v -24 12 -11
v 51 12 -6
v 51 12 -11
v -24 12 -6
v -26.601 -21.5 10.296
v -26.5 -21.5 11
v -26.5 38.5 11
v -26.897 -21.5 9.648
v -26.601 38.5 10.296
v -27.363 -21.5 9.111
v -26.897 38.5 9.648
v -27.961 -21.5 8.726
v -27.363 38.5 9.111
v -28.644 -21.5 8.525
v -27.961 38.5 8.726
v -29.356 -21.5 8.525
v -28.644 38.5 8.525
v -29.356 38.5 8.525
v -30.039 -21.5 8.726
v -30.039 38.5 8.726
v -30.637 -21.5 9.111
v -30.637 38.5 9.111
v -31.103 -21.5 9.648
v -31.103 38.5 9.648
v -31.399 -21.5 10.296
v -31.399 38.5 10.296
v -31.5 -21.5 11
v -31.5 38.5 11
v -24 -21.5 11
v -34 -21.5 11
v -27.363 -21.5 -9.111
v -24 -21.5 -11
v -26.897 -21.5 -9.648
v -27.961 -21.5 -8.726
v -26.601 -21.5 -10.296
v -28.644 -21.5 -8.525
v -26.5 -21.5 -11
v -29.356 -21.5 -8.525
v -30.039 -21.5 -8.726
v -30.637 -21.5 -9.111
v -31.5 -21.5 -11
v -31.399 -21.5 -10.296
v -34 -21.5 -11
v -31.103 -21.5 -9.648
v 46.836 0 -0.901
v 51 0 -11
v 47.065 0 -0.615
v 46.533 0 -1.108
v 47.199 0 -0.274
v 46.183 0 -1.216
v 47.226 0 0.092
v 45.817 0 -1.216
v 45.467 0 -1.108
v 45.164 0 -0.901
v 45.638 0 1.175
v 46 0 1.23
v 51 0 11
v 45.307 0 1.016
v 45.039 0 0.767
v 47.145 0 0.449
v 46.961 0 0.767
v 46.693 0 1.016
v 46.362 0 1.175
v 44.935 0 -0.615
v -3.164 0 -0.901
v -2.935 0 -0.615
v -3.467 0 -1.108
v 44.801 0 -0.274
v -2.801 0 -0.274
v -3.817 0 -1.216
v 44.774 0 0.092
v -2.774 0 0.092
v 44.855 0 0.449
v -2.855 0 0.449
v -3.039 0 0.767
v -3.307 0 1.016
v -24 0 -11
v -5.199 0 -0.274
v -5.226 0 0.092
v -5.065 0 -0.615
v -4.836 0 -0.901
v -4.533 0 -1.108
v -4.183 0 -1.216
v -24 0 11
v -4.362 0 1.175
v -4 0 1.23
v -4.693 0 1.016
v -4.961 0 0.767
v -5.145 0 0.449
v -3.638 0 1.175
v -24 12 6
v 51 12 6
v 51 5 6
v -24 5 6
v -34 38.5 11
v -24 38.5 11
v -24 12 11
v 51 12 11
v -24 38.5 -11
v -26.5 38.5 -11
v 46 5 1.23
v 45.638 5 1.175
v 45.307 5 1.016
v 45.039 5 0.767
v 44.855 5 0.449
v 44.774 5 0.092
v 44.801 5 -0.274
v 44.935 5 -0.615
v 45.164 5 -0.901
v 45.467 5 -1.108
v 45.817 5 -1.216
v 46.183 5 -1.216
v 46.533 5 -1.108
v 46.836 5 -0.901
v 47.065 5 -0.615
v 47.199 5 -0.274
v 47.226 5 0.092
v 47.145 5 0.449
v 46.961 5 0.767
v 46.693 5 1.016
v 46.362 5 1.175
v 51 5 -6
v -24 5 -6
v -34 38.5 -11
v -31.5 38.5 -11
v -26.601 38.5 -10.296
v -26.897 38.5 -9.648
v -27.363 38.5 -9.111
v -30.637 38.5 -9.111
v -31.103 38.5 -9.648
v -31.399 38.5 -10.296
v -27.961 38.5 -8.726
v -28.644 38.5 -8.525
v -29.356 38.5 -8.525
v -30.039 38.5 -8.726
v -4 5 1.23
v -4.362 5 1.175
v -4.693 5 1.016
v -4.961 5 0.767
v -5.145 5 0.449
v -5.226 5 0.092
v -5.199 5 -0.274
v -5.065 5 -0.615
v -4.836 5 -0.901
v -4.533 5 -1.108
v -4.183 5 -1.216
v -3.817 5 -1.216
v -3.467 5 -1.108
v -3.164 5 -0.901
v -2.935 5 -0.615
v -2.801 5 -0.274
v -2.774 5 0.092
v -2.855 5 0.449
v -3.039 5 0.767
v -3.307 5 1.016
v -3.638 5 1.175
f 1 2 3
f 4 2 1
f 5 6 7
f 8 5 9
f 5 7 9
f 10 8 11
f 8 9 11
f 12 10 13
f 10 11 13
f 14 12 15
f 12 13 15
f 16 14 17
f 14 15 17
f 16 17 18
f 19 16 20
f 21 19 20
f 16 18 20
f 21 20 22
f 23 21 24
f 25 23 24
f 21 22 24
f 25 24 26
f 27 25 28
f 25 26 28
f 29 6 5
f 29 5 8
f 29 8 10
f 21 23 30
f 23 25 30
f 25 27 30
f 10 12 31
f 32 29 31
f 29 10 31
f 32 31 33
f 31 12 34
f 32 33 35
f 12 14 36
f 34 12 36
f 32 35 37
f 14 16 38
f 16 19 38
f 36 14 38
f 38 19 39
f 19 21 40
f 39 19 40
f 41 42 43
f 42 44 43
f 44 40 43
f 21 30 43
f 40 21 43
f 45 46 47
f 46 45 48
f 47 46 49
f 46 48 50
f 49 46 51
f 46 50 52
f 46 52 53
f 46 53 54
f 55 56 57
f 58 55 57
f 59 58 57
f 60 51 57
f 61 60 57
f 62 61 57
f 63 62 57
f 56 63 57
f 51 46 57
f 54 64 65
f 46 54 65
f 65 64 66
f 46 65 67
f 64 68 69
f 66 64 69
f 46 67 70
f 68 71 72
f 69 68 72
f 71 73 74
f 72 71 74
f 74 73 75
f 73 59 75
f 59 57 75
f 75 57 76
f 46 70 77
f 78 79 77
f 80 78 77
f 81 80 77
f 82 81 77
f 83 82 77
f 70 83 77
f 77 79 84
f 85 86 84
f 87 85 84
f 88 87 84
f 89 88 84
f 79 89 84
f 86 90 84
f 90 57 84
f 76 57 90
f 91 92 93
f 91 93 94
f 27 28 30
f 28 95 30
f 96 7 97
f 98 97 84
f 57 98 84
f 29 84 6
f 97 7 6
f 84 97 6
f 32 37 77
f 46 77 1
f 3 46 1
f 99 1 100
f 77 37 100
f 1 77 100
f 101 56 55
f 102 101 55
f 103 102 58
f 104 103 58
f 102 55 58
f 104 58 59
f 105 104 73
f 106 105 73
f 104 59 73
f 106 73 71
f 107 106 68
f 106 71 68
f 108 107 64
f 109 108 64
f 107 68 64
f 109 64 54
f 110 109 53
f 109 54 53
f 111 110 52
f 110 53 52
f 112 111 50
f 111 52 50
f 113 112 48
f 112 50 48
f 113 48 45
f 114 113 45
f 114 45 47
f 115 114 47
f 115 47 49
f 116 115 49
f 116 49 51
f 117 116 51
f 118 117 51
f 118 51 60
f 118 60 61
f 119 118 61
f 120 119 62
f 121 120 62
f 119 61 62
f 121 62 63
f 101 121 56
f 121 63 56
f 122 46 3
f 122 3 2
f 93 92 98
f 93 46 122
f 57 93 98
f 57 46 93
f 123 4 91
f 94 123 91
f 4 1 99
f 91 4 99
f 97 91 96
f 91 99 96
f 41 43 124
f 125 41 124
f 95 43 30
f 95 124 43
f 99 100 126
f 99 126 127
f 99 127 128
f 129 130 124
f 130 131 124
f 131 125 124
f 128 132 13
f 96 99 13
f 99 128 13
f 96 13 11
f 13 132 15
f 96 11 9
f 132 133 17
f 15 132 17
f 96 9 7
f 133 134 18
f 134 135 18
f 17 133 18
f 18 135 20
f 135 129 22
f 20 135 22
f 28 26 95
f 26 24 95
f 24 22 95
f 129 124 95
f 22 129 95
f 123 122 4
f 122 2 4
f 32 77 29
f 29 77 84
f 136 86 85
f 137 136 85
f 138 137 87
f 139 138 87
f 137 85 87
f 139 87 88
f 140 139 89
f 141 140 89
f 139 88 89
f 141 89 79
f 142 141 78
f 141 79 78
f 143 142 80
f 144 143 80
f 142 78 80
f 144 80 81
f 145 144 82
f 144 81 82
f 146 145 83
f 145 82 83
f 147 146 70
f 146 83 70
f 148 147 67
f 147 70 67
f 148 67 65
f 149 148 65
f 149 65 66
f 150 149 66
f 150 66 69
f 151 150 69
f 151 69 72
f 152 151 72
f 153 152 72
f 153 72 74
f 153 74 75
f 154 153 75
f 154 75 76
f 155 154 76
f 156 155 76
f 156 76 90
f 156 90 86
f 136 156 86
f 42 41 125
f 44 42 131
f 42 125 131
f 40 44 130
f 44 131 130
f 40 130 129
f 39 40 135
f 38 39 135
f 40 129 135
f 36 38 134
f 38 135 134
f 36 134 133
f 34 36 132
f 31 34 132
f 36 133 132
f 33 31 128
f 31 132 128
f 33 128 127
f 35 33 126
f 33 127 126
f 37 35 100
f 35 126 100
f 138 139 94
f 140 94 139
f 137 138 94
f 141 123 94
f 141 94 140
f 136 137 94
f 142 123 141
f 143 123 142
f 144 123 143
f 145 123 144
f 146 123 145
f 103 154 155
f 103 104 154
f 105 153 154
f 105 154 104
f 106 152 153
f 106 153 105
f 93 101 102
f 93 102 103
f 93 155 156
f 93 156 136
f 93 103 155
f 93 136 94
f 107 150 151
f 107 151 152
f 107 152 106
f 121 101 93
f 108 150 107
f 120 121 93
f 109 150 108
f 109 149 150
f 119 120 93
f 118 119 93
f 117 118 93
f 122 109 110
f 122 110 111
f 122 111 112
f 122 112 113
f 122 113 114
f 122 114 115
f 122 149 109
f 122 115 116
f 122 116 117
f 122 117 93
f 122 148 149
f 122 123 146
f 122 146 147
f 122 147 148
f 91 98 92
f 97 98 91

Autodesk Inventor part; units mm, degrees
ref_plane "YZ Plane" through (0, 0, 0) normal (1, 0, 0) x (0, 1, 0)
ref_plane "XZ Plane" through (0, 0, 0) normal (0, 1, 0) x (-1, 0, 0)
ref_plane "XY Plane" through (0, 0, 0) normal (0, 0, 1) x (1, 0, 0)
sketch "スケッチ1" plane through (0, 0, 0) normal (0, 1, 0) x (-1, 0, 0)
  line L0 (34, -11) -> (-51, -11)
  line L1 (-51, -11) -> (-51, 11)
  line L2 (-51, 11) -> (34, 11)
  line L3 (34, 11) -> (34, -11)
  line L4 (34, 0) -> (-51, 0) construction
  point P0 (0, 0)
  point P1 (0, 0)
  point P2 (-46, 0)
  dimension "d0" = 22
  dimension "d1" = 85
  dimension "d2" = 5
  dimension "d3" = 46
extrude "押し出し1" add sketch "スケッチ1" along normal blind 12
sketch "スケッチ2" plane through (0, 12, 0) normal (0, 1, 0) x (1, 0, 0)
  line L0 (-34, 11) -> (-34, -11) projected
  line L1 (51, -11) -> (51, 11) projected
  line L2 (-34, 0) -> (51, 0)
  line L3 (51, 0) -> (51, 6)
  line L4 (51, 6) -> (-34, 6)
  line L5 (-34, 6) -> (-34, 0)
  line L6 (51, 0) -> (51, -6)
  line L7 (51, -6) -> (-34, -6)
  line L8 (-34, -6) -> (-34, 0)
  point P0 (0, 0)
  point P1 (-34, -6)
  point P2 (-34, 6)
  dimension "d6" = 12
extrude "押し出し2" cut sketch "スケッチ2" against normal blind 7
sketch "スケッチ3" plane through (0, 5, 0) normal (0, 1, 0) x (1, 0, 0)
  point P0 (0, 0)
  point P1 (-4, 0)
  point P2 (46, 0)
  dimension "d9" = 4
  dimension "d10" = 50
hole "穴1" at (-4, 5, 0) at (46, 5, 0) direction (0, -1, 0) diameter 2.459 end through all thread size "M3x0.5" class "6H" standard "ISO Metric profile"
sketch "スケッチ4" plane through (-34, 0, -11) normal (-1, 0, 0) x (0, 0, 1)
  line L0 (0, 38.5) -> (22, 38.5)
  line L1 (22, 38.5) -> (22, -21.5)
  line L2 (22, -21.5) -> (0, -21.5)
  line L3 (0, -21.5) -> (0, 38.5)
  line L4 (0, 0) -> (0, 12) projected
  line L5 (22, 0) -> (22, 12) projected
  line L6 (0, 12) -> (5, 12) construction
  line L7 (5, 12) -> (17, 5) construction
  line L8 (22, 38.5) -> (0, -21.5) construction
  point P0 (11, 0)
  point P1 (11, 8.5)
  dimension "d18" = 60
extrude "押し出し3" add sketch "スケッチ4" against normal blind 10
sketch "スケッチ5" plane through (-34, 38.5, 11) normal (0, 1, 0) x (1, 0, 0)
  line L0 (0, 22) -> (10, 22) projected
  line L1 (0, 0) -> (10, 0) projected
  circle A0 centre (5, 0) radius 2.5
  circle A1 centre (5, 22) radius 2.5
  point P0 (34, 11)
  dimension "d21" = 5
  dimension "d22" = 5
extrude "押し出し4" cut sketch "スケッチ5" against normal through all
properties part number "forkmount" material "ABS プラスチック"
